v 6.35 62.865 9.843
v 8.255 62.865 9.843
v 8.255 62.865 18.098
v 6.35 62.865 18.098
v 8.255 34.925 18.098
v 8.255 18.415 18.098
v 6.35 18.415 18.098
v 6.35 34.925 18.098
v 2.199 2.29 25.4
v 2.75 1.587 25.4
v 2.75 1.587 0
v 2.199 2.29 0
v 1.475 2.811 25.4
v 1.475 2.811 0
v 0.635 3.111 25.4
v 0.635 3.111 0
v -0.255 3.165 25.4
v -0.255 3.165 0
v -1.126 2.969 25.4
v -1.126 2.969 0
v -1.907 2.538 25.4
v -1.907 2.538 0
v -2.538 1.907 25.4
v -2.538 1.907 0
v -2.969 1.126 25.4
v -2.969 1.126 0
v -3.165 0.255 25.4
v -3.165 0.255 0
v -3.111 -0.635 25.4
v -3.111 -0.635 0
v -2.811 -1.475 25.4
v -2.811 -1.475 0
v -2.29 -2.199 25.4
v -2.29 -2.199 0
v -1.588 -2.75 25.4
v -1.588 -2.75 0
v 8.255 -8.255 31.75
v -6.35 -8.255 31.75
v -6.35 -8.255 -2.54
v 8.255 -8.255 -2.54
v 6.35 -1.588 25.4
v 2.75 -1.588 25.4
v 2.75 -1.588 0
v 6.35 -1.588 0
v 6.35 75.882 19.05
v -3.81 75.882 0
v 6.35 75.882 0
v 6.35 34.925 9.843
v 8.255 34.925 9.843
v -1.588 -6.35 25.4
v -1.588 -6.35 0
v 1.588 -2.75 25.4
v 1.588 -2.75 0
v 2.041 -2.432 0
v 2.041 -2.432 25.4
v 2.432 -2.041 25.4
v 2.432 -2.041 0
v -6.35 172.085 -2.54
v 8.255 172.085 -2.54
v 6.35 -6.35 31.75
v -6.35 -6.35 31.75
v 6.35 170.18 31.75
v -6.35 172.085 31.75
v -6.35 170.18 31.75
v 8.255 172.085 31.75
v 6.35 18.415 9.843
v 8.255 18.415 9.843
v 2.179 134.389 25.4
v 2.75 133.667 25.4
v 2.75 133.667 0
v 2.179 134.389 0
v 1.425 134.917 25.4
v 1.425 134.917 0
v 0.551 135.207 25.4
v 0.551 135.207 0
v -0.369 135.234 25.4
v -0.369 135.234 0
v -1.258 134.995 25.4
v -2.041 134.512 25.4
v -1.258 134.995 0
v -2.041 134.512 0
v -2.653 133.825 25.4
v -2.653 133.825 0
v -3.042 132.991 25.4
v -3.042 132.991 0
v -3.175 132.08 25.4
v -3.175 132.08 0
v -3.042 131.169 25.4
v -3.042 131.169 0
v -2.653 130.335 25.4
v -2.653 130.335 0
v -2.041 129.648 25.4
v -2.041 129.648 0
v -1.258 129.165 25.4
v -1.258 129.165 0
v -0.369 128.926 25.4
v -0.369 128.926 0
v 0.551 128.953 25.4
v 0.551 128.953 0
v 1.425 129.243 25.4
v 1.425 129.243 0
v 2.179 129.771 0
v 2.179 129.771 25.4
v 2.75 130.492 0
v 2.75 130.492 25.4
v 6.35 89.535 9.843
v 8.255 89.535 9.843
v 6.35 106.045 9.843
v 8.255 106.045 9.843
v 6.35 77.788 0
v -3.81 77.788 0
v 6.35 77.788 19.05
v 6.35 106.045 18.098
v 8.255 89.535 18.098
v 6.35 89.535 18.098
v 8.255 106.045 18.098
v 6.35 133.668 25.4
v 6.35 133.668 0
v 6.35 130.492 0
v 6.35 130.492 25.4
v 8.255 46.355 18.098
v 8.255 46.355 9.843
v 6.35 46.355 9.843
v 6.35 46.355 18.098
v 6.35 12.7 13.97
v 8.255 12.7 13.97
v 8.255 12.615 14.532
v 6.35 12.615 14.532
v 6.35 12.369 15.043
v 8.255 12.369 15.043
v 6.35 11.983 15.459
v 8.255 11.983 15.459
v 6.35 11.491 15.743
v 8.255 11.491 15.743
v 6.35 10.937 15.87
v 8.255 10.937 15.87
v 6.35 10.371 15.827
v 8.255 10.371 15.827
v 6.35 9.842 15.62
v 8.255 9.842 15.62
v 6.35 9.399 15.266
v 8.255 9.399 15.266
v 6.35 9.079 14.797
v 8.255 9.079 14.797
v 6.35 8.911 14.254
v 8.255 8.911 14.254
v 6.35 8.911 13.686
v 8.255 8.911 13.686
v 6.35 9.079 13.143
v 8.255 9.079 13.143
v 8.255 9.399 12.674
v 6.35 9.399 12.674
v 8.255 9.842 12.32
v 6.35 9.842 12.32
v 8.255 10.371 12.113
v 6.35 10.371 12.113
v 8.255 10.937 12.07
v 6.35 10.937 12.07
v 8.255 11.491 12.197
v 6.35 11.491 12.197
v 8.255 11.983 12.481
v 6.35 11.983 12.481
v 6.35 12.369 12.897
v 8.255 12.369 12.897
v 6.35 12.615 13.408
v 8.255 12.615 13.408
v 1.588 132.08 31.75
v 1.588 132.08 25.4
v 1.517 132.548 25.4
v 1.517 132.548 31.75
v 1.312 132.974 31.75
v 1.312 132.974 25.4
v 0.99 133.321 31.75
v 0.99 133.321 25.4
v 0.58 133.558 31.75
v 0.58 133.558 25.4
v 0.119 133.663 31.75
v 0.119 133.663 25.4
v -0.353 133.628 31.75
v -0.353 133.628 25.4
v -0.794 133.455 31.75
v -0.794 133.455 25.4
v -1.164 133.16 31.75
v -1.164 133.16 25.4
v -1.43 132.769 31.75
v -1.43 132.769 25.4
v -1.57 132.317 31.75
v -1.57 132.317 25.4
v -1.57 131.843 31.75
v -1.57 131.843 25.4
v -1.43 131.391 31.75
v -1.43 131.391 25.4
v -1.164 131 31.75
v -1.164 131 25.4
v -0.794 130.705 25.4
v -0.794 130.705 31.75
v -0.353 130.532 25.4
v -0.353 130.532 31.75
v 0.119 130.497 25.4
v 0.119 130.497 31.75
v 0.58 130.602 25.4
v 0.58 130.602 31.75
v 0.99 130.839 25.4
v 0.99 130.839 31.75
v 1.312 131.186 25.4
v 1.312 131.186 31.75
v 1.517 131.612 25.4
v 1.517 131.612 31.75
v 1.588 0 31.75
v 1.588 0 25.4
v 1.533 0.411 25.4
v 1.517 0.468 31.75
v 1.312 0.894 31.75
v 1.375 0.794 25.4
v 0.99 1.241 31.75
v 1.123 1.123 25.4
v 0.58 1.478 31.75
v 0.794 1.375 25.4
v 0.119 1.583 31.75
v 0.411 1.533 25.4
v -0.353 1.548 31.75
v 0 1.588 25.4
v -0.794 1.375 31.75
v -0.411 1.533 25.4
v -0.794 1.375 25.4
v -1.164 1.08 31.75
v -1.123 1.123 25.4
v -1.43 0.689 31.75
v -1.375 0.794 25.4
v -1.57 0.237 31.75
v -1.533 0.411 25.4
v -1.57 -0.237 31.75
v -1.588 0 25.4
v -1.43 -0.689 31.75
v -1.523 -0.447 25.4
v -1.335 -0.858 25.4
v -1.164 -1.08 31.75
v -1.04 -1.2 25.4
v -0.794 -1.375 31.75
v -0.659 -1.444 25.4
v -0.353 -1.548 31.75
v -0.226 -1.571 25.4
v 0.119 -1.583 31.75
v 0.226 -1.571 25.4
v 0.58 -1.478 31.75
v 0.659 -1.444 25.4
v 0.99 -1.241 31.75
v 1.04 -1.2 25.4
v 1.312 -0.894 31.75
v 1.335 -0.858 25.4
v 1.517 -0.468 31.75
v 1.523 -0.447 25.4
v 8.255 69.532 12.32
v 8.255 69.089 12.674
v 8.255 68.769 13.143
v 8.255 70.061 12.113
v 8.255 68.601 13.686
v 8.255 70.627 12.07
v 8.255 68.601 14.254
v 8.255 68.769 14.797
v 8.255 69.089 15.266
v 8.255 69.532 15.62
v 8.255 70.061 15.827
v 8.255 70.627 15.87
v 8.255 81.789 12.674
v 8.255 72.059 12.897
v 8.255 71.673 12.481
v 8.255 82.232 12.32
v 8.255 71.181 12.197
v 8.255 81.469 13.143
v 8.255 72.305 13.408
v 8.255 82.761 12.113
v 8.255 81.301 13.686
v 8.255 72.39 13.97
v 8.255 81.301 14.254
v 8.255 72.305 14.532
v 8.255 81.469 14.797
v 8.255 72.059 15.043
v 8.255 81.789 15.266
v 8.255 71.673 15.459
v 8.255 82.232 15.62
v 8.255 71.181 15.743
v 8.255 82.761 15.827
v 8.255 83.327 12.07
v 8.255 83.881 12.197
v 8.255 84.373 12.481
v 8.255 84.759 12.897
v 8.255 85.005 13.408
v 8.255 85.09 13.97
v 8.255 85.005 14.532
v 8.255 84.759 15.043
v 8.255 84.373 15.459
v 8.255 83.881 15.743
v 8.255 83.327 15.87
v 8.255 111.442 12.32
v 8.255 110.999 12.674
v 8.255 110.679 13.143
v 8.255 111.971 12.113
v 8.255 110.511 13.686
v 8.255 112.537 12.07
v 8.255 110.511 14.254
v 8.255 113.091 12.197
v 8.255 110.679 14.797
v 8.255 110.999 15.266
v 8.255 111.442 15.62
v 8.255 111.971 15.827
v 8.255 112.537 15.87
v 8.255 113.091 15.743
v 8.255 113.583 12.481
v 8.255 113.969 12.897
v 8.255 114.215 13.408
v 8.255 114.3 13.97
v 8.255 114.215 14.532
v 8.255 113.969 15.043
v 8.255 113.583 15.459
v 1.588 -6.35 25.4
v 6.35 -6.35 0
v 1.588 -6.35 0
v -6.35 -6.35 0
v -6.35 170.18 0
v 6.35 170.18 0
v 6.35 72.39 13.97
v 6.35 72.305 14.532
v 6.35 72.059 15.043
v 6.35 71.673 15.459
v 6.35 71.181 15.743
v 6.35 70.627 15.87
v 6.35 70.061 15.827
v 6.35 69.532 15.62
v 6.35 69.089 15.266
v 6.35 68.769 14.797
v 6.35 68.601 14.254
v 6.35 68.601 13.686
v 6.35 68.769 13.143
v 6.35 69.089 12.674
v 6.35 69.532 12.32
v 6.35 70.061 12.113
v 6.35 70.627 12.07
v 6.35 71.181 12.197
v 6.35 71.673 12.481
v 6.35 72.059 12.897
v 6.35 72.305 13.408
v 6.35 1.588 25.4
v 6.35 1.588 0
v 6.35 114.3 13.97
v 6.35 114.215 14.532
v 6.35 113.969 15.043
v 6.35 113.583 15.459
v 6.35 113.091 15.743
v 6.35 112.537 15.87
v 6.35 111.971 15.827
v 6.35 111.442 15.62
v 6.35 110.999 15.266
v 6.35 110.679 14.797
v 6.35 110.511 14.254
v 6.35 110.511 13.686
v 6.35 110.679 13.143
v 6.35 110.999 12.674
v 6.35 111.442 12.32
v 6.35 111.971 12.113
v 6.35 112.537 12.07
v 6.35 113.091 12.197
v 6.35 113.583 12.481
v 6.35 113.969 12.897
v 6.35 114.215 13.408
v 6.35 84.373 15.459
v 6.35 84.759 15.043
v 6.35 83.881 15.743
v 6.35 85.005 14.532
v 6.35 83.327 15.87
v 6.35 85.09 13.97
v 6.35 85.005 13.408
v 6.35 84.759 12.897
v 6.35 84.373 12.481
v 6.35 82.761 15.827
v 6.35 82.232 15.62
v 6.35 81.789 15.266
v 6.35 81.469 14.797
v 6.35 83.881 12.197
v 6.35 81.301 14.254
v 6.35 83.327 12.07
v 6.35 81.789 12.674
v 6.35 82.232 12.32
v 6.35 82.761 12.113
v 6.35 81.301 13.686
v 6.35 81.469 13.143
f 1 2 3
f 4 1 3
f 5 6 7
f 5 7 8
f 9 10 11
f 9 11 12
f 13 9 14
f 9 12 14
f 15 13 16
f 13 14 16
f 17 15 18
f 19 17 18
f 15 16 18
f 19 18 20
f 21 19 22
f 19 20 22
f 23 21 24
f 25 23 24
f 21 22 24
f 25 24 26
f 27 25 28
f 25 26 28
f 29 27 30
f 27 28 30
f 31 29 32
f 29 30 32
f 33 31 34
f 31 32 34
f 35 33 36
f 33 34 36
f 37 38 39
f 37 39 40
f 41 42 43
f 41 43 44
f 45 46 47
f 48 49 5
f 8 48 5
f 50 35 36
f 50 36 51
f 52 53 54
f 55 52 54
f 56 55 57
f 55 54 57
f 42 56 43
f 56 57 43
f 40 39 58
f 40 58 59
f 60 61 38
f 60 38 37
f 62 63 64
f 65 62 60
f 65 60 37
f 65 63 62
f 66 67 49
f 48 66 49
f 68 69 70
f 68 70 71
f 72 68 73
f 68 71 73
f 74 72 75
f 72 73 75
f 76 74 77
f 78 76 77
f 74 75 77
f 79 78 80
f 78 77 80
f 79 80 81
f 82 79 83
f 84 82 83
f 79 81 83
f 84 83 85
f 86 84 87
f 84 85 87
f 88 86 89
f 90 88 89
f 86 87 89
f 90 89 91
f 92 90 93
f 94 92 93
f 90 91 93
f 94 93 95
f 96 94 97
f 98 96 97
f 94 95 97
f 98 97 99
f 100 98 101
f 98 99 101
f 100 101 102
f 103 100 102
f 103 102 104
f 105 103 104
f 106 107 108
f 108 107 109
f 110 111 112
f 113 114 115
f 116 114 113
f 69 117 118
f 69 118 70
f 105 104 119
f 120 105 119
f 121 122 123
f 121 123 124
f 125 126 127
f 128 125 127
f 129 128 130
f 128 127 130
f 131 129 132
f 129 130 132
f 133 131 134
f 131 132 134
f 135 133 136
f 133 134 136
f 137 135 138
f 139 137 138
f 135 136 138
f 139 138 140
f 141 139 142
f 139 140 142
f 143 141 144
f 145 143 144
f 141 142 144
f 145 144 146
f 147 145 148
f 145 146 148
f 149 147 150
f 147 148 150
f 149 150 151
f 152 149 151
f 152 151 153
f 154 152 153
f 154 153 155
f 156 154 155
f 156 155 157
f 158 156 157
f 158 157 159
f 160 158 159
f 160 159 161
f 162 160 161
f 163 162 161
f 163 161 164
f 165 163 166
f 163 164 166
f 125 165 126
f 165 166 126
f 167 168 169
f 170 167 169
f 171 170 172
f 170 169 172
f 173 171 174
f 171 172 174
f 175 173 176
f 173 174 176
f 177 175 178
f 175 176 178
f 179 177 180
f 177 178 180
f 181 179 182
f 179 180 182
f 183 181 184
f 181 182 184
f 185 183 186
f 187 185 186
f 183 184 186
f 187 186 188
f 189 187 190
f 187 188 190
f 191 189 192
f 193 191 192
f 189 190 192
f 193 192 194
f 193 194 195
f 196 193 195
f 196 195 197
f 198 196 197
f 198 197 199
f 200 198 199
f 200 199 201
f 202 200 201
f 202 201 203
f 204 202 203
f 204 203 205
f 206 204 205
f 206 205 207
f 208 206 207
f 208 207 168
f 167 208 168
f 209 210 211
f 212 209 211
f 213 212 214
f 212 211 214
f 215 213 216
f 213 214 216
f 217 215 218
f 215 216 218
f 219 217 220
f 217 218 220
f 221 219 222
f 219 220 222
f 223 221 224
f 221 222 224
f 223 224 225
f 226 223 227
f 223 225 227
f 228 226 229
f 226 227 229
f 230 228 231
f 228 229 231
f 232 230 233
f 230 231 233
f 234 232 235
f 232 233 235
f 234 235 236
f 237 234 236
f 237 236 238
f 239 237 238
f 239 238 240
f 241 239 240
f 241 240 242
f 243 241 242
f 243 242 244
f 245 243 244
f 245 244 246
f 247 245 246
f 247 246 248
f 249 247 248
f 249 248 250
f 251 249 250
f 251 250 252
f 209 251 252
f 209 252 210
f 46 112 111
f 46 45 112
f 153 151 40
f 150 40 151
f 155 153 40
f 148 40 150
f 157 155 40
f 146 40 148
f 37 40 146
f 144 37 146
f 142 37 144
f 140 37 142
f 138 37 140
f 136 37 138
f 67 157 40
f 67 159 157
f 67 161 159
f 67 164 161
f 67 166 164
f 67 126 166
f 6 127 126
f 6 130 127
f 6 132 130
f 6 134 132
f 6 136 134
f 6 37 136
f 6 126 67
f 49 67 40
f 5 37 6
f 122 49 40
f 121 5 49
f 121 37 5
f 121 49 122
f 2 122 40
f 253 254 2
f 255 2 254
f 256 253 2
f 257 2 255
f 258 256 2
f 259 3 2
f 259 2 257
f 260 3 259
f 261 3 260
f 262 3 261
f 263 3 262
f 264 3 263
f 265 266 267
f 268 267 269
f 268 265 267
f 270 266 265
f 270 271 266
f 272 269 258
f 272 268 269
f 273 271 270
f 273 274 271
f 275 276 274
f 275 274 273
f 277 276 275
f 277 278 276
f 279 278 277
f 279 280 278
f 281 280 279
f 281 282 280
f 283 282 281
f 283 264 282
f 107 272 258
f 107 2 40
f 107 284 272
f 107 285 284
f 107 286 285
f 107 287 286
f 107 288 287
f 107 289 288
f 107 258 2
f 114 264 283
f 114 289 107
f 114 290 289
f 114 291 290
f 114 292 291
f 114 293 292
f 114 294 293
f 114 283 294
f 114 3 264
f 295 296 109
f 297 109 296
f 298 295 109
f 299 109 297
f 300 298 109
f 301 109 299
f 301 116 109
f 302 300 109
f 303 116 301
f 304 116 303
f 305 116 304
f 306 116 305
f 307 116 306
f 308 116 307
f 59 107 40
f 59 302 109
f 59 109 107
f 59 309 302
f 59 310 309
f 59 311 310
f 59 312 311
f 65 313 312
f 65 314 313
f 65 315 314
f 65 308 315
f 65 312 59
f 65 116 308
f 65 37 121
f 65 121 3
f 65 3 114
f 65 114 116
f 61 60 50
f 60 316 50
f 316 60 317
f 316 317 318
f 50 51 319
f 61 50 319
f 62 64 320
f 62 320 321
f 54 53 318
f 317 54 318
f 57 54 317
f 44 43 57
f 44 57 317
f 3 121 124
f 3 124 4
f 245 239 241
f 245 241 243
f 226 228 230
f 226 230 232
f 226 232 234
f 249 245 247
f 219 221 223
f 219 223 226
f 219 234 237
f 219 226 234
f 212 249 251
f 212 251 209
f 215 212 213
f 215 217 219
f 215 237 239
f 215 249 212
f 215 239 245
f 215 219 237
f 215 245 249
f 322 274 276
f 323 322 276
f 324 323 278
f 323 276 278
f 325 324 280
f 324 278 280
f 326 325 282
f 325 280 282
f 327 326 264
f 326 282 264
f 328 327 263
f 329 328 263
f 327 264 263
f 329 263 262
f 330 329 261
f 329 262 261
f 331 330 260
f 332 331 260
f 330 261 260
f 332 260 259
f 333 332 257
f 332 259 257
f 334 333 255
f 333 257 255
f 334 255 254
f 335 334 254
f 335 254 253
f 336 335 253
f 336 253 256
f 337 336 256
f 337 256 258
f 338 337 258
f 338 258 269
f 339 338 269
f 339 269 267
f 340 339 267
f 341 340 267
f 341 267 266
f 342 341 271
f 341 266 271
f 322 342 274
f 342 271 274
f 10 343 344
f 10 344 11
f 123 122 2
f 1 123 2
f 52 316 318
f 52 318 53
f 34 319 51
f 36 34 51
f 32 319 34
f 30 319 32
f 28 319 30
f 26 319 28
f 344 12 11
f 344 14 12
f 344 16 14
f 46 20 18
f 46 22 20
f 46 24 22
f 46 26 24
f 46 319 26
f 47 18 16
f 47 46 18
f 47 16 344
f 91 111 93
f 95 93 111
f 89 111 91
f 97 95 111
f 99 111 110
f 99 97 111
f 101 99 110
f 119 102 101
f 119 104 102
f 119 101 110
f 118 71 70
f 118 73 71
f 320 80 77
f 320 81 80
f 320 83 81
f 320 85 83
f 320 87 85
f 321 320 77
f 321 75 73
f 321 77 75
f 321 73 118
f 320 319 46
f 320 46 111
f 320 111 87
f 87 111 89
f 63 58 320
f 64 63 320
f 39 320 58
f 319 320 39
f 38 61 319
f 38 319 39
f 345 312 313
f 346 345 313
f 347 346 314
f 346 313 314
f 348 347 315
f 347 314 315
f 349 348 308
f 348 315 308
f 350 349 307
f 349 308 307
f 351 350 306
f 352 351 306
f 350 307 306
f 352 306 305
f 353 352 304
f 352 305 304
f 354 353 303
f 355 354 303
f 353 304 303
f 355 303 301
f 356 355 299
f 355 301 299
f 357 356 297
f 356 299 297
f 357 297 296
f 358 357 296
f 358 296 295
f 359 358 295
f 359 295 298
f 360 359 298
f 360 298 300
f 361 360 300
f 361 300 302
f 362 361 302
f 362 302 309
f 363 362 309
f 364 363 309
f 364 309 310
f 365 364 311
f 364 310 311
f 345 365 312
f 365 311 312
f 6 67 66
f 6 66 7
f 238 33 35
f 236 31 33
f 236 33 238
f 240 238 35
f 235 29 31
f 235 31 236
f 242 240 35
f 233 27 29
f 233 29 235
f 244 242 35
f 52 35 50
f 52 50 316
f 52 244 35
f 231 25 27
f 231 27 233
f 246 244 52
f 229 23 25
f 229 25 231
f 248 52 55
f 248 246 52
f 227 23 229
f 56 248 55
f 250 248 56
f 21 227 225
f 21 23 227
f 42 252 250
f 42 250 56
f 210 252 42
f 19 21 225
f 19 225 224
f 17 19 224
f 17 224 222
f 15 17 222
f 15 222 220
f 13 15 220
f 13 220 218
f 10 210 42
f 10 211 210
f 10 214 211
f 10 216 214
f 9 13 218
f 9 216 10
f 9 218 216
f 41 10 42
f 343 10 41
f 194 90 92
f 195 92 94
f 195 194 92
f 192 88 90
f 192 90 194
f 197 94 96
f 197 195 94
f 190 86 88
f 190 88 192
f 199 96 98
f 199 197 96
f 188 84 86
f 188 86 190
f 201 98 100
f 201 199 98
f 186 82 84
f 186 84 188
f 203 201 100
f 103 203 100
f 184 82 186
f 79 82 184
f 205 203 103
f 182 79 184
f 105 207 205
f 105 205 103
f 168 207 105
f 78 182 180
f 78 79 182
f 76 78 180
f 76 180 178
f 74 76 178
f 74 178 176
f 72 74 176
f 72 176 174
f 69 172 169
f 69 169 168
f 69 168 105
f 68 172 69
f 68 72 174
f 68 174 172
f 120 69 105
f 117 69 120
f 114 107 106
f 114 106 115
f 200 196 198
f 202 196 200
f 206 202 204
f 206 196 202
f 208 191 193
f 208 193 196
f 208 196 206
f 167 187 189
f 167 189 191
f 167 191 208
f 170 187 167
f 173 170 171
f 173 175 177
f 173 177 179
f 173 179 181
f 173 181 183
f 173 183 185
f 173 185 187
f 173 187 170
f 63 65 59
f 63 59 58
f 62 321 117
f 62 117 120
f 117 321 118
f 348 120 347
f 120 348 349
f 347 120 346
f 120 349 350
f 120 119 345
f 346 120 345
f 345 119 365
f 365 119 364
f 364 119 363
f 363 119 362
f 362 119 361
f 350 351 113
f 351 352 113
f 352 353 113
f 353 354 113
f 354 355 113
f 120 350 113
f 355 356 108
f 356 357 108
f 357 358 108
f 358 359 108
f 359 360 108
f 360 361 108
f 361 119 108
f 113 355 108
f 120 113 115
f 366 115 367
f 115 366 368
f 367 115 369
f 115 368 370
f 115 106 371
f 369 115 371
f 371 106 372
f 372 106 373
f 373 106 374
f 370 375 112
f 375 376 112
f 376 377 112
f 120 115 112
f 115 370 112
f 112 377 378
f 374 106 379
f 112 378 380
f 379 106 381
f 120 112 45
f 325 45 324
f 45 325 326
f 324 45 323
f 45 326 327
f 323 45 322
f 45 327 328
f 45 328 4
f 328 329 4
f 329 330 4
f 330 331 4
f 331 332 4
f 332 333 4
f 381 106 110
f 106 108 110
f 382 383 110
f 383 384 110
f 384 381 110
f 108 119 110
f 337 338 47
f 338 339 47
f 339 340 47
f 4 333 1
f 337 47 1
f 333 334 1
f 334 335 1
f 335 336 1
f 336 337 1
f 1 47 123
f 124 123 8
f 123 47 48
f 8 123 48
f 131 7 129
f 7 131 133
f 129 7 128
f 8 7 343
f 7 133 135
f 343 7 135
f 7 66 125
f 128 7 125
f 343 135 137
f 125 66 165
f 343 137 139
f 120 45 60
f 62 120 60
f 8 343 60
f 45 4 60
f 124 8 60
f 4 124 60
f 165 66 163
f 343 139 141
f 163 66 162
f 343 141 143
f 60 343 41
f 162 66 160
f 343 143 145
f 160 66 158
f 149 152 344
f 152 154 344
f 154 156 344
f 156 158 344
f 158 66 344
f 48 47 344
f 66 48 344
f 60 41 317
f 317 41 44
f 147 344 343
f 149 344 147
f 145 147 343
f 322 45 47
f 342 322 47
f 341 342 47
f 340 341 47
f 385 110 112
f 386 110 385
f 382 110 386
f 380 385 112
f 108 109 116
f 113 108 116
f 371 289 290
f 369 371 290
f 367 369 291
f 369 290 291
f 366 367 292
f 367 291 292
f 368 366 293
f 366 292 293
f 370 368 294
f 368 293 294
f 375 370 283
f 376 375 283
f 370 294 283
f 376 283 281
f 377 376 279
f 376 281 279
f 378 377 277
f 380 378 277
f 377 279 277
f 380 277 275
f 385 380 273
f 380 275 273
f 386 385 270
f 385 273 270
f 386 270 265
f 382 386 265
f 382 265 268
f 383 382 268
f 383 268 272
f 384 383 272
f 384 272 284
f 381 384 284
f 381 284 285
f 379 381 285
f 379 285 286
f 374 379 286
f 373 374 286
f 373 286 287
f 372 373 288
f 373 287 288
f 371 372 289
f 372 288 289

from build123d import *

# Parameters (mm, degrees)
F0_R          = 3.175
F0_R_2        = 1.5875
F1_DEPTH      = 2.54
F2_DEPTH      = 25.4
F3_DEPTH      = 31.75
F5_DEPTH      = 31.75
F5_DEPTH_BACK = 2.54
F7_DEPTH      = 25.4
F8_W          = 16.51
F8_H          = 8.255
F8_R          = 1.905
F9_DEPTH      = 1.905
F12_DEPTH     = 0.9525


with BuildPart() as f1:
    # F0 (on Top) → F1 (new body)
    with BuildSketch(Plane.XY):
        Polygon((6.35, 170.18), (0, 170.18), (-6.35, 170.18), (-6.35, -6.35), (0, -6.35), (6.35, -6.35), align=None)
        Circle(F0_R, mode=Mode.SUBTRACT)
        with Locations((0, 132.08)):
            Circle(F0_R, mode=Mode.SUBTRACT)
        with Locations((0, 132.08)):
            Circle(F0_R)
        with Locations((0, 132.08)):
            Circle(F0_R_2, mode=Mode.SUBTRACT)
        with Locations((0, 132.08)):
            Circle(F0_R_2)
        Circle(F0_R)
        Circle(F0_R_2, mode=Mode.SUBTRACT)
        Circle(F0_R_2)
    extrude(amount=-F1_DEPTH)

    # F0 (on Top) → F2 (join)
    with BuildSketch(Plane.XY):
        with Locations((0, 132.08)):
            Circle(F0_R)
        with Locations((0, 132.08)):
            Circle(F0_R_2, mode=Mode.SUBTRACT)
        with Locations((0, 132.08)):
            Circle(F0_R_2)
        Circle(F0_R_2)
        Circle(F0_R)
        Circle(F0_R_2, mode=Mode.SUBTRACT)
    extrude(amount=F2_DEPTH)

    # F0 (on Top) → F3 (join)
    with BuildSketch(Plane.XY):
        Circle(F0_R_2)
        with Locations((0, 132.08)):
            Circle(F0_R_2)
    extrude(amount=F3_DEPTH)

    # F4 (on Top) → F5 (join, two sides)
    with BuildSketch(Plane.XY) as f5_sk:
        Polygon((-6.35, -6.35), (-6.35, -8.255), (8.255, -8.255), (8.255, 172.085), (-6.35, 172.085), (-6.35, 170.18), (6.35, 170.18), (6.35, -6.35), align=None)
    extrude(amount=F5_DEPTH)
    extrude(f5_sk.sketch, amount=-F5_DEPTH_BACK)

    # F6 (on face) → F7 (join)
    with BuildSketch(Plane.XY):
        with BuildLine():
            Line((6.35, 133.6675), (0, 133.6675))
            ThreePointArc((0, 133.6675), (-1.5875, 132.08), (0, 130.4925))
            Line((0, 130.4925), (6.35, 130.4925))
            Line((6.35, 130.4925), (6.35, 133.6675))
        make_face()
        with BuildLine():
            Line((6.35, 1.5875), (0, 1.5875))
            ThreePointArc((0, 1.5875), (-1.122532, 1.122532), (-1.5875, 0))
            Line((-1.5875, 0), (-1.5875, -6.35))
            Line((-1.5875, -6.35), (1.5875, -6.35))
            Line((1.5875, -6.35), (1.5875, -1.5875))
            Line((1.5875, -1.5875), (6.35, -1.5875))
            Line((6.35, -1.5875), (6.35, 1.5875))
        make_face()
    extrude(amount=F7_DEPTH)

    # F8 (on face) → F9 (cut, through all)
    with BuildSketch(Plane.YZ.offset(8.255)):
        with Locations((26.67, 13.97)):
            Rectangle(F8_W, F8_H)
        with Locations((10.795, 13.97)):
            Circle(F8_R)
        with Locations((54.61, 13.97)):
            Rectangle(F8_W, F8_H)
        with Locations((70.485, 13.97)):
            Circle(F8_R)
        with Locations((97.79, 13.97)):
            Rectangle(F8_W, F8_H)
        with Locations((83.185, 13.97)):
            Circle(F8_R)
        with Locations((112.395, 13.97)):
            Circle(F8_R)
    extrude(amount=-F9_DEPTH, mode=Mode.SUBTRACT)

    # F11 (on offset) → F12 (join, symmetric)
    with BuildSketch(Plane.XZ.offset(-76.835)):
        Polygon((6.35, 19.05), (-3.81, 0), (6.35, 0), align=None)
    extrude(amount=F12_DEPTH, both=True)


solid = f1.part
